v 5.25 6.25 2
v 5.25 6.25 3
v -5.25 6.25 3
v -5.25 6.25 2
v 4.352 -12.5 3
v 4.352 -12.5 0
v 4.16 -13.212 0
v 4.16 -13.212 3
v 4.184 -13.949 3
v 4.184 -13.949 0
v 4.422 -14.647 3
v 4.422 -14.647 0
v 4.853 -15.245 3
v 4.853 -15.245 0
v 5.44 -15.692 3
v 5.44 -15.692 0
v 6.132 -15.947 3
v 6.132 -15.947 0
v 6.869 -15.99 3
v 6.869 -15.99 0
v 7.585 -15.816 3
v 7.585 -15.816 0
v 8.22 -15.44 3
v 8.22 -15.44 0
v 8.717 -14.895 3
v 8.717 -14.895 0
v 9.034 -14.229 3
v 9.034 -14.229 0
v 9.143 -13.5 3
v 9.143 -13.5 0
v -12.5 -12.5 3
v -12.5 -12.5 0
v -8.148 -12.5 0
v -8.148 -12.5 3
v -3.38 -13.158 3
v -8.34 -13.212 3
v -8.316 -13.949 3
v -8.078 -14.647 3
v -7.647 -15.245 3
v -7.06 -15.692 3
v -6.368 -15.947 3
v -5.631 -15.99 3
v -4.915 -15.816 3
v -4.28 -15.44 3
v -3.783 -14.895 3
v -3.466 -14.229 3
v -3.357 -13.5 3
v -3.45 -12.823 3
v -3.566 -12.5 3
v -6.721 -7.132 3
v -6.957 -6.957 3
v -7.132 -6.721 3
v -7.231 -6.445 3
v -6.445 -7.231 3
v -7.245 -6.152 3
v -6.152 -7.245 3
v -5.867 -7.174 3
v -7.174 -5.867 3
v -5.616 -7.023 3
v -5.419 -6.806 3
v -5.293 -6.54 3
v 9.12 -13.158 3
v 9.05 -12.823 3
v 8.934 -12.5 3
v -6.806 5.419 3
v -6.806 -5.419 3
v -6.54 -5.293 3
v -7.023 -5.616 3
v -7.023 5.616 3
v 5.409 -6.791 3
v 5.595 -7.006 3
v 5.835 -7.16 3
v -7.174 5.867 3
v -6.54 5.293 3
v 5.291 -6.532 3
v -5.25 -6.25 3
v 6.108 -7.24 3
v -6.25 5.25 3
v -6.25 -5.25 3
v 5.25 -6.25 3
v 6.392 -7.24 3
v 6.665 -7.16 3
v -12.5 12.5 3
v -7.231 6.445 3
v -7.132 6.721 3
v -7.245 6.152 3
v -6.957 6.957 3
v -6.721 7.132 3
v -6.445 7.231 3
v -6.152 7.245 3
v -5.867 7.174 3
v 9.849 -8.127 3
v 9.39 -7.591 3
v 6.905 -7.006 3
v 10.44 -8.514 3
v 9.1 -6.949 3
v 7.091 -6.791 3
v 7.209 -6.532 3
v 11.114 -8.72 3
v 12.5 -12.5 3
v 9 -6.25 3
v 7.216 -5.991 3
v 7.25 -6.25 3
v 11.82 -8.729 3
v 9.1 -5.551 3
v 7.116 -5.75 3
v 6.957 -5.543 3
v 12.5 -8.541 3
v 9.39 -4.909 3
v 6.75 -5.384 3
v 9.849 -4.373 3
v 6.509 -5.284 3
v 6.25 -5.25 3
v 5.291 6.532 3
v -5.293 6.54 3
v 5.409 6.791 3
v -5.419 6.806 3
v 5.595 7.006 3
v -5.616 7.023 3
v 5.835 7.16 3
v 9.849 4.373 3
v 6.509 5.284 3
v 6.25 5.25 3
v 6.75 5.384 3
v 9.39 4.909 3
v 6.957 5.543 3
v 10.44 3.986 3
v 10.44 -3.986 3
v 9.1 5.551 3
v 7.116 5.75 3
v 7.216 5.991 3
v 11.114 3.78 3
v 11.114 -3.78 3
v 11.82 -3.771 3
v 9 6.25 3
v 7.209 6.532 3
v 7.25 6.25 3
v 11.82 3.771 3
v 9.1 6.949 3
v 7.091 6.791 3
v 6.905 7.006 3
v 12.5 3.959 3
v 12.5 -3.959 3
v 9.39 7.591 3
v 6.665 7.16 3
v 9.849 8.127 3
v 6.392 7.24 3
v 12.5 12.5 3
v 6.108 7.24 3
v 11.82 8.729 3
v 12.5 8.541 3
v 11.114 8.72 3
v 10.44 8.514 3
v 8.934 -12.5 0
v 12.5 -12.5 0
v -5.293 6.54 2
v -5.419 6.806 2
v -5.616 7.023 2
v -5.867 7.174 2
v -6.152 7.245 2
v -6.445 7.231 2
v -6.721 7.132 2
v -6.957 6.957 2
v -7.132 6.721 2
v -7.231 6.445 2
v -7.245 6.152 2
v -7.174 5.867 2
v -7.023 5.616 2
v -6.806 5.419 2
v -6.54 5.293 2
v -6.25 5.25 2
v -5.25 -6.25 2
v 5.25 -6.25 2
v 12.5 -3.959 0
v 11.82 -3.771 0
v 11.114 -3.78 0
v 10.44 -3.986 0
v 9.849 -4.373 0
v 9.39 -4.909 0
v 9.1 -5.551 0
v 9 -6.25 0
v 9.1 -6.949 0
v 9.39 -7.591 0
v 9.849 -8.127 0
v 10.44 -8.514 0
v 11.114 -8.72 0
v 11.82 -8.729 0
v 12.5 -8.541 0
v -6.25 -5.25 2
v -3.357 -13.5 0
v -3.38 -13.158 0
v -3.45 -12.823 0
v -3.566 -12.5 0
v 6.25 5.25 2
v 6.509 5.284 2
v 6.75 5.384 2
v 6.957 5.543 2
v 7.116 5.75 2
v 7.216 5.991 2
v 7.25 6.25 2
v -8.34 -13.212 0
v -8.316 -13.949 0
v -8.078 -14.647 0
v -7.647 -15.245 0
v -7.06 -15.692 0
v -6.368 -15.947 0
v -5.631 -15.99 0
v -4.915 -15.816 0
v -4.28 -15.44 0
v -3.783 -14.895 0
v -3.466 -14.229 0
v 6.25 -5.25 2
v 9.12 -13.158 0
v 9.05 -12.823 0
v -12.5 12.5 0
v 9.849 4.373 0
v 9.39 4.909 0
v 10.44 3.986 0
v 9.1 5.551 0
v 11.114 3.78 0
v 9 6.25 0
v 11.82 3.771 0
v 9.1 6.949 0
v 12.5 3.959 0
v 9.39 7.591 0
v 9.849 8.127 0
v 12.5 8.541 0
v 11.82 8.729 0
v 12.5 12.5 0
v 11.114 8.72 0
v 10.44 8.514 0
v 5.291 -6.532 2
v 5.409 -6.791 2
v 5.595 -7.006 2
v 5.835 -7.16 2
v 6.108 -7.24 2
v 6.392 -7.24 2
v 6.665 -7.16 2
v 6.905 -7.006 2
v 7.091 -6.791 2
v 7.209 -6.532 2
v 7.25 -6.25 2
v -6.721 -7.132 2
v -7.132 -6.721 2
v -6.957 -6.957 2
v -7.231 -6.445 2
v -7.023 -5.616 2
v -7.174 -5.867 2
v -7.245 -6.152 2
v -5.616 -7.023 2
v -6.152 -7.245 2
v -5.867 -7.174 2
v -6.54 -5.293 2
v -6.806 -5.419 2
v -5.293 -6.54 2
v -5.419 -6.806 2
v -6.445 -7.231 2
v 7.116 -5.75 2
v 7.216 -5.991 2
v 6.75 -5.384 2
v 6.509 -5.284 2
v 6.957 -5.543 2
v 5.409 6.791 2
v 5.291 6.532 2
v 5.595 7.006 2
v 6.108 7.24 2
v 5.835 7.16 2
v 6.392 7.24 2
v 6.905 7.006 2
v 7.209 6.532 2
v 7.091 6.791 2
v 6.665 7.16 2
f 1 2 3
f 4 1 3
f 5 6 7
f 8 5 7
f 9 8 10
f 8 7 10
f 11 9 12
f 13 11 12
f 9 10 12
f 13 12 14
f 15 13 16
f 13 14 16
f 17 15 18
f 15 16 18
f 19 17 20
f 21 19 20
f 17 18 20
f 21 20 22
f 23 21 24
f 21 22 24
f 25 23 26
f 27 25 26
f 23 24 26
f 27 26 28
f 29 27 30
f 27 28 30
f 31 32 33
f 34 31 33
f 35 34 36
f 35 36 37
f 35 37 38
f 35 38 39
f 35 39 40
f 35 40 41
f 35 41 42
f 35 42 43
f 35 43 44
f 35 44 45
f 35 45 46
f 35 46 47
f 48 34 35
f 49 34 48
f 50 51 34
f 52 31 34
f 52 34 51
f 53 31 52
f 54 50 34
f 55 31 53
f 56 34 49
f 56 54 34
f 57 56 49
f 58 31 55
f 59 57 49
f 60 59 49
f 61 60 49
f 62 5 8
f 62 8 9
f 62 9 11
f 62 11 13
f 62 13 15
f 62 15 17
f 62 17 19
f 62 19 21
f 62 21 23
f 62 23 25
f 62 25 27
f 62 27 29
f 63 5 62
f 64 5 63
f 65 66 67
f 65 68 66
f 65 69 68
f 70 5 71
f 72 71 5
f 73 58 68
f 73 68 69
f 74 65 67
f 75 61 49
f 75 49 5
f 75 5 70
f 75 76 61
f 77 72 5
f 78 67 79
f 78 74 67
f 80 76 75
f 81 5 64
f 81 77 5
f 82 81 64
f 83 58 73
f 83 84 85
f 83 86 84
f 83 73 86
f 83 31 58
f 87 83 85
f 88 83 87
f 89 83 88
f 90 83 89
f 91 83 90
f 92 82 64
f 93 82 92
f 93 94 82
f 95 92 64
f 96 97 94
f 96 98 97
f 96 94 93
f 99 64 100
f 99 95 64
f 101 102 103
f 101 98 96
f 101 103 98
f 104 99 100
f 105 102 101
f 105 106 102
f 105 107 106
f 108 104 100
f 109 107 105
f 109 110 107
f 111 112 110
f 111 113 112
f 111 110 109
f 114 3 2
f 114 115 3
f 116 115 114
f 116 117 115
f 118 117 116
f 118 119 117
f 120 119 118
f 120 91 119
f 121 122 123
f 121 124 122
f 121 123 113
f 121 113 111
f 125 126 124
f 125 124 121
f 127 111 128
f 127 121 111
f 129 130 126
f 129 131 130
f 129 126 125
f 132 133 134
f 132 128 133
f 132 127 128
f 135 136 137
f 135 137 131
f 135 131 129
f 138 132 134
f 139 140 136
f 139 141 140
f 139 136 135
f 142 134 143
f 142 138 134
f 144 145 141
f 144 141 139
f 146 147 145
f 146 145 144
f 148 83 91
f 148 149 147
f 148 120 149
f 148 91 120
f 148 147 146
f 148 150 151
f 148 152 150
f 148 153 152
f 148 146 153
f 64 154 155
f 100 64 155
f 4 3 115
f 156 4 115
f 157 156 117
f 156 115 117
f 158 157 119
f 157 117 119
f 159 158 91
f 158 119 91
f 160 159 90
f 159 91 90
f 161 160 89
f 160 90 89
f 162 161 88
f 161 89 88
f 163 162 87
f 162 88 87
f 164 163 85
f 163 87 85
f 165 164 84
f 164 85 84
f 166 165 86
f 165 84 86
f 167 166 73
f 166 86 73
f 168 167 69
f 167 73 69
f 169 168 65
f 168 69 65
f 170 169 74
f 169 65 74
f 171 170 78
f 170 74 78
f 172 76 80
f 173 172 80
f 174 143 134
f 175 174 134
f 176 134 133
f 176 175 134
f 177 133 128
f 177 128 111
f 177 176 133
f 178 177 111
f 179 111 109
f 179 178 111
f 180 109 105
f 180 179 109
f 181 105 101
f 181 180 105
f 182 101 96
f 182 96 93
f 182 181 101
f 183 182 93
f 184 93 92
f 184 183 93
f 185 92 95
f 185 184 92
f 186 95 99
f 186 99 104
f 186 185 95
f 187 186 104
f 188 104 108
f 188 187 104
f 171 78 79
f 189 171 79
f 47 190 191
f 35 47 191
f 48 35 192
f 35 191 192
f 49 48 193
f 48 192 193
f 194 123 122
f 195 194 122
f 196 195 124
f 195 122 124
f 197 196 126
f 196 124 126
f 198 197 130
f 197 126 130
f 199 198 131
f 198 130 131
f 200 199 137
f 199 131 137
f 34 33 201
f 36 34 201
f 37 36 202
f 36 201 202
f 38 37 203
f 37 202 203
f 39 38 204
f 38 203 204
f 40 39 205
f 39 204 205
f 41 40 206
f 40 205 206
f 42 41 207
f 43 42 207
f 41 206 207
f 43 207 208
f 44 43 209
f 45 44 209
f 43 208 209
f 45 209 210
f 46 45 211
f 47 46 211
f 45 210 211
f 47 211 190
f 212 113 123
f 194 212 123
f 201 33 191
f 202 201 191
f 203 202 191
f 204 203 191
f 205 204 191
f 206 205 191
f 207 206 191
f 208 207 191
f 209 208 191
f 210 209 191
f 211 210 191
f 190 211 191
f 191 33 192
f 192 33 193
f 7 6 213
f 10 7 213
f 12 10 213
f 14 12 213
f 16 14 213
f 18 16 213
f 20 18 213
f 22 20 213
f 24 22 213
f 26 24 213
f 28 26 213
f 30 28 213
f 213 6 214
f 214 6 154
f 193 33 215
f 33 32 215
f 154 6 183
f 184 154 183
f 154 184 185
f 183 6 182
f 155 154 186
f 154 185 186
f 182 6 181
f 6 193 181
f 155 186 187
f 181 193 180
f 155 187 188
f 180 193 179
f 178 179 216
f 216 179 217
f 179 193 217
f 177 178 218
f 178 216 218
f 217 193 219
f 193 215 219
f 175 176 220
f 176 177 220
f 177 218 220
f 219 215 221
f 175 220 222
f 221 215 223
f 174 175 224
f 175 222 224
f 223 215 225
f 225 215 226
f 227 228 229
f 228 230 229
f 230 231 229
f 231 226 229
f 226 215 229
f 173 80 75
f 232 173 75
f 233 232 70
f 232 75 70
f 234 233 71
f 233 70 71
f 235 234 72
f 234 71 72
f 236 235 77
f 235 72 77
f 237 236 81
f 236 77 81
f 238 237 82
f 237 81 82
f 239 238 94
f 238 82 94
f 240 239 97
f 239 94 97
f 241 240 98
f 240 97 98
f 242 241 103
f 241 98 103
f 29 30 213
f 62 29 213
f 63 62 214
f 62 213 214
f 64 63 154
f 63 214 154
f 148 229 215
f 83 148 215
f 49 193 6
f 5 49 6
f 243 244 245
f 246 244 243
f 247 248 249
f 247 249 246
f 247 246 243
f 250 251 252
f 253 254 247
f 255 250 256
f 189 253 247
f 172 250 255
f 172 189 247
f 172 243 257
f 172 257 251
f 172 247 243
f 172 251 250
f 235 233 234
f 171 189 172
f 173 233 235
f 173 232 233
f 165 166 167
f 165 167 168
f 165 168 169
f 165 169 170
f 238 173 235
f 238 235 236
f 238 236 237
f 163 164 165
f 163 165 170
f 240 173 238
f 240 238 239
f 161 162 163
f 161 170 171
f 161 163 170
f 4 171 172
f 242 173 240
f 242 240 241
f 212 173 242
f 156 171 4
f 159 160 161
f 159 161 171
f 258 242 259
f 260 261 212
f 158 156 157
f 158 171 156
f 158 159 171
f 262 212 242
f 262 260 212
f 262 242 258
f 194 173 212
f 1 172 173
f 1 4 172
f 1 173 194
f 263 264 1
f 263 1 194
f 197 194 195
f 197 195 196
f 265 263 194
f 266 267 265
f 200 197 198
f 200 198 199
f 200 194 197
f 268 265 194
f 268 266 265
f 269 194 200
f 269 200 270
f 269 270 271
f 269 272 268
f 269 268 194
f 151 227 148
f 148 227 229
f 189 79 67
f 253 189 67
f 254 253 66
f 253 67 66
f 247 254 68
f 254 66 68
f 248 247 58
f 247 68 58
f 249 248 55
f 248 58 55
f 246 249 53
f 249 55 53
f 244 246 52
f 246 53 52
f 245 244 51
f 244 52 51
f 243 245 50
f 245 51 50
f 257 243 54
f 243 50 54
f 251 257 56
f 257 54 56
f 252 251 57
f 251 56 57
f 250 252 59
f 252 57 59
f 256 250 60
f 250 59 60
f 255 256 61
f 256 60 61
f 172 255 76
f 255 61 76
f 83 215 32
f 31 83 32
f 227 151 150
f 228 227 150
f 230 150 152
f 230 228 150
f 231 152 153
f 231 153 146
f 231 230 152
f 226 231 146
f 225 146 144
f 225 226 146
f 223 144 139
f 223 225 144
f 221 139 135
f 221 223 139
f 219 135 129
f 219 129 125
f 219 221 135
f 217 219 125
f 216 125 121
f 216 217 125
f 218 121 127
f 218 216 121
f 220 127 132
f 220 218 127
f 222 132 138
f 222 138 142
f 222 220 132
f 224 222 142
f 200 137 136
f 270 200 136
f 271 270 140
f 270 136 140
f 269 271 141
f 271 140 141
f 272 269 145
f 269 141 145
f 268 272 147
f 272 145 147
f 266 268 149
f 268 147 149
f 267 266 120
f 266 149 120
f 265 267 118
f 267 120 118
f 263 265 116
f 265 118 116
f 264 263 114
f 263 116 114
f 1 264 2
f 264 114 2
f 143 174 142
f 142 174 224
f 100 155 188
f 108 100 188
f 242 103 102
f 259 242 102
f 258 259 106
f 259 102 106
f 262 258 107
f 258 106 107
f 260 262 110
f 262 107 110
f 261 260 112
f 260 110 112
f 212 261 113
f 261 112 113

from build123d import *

# Parameters (mm, degrees)
F1_DEPTH = 3
F3_DEPTH = 1
F4_R     = 2.5
F5_DEPTH = 3
F6_DEPTH = 3


with BuildPart() as f1:
    # F0 (on Top) → F1 (new body)
    with BuildSketch(Plane.XY):
        with BuildLine():
            Line((12.5, -12.5), (12.5, 12.5))
            Line((12.5, 12.5), (-12.5, 12.5))
            Line((-12.5, 12.5), (-12.5, -12.5))
            Line((-12.5, -12.5), (-8.1482400118, -12.5))
            ThreePointArc((-8.1482400118, -12.5), (-5.8569521643, -11), (-3.5656643168, -12.5))
            Line((-3.5656643168, -12.5), (4.3517599882, -12.5))
            ThreePointArc((4.3517599882, -12.5), (6.6430478357, -11), (8.9343356832, -12.5))
            Line((8.9343356832, -12.5), (12.5, -12.5))
        make_face()
        with BuildLine():
            ThreePointArc((9.1430478357, -13.5), (9.090313618, -12.9892258908), (8.9343356832, -12.5))
            Line((8.9343356832, -12.5), (4.3517599882, -12.5))
            ThreePointArc((4.3517599882, -12.5), (6.1322737265, -15.9472657823), (9.1430478357, -13.5))
        make_face()
        with BuildLine():
            Line((4.3517599882, -12.5), (8.9343356832, -12.5))
            ThreePointArc((8.9343356832, -12.5), (6.6430478357, -11), (4.3517599882, -12.5))
        make_face()
        with BuildLine():
            ThreePointArc((-3.5656643168, -12.5), (-5.8569521643, -11), (-8.1482400118, -12.5))
            Line((-8.1482400118, -12.5), (-3.5656643168, -12.5))
        make_face()
        with BuildLine():
            Line((-3.5656643168, -12.5), (-8.1482400118, -12.5))
            ThreePointArc((-8.1482400118, -12.5), (-6.3677262735, -15.9472657823), (-3.3569521643, -13.5))
            ThreePointArc((-3.3569521643, -13.5), (-3.409686382, -12.9892258908), (-3.5656643168, -12.5))
        make_face()
    extrude(amount=F1_DEPTH)

    # F2 (on face) → F3 (cut)
    with BuildSketch(Plane.XY.offset(3)):
        with BuildLine():
            Line((5.25, 6.25), (-5.25, 6.25))
            ThreePointArc((-5.25, 6.25), (-5.5428932188, 5.5428932188), (-6.25, 5.25))
            Line((-6.25, 5.25), (-6.25, -5.25))
            ThreePointArc((-6.25, -5.25), (-5.5428932188, -5.5428932188), (-5.25, -6.25))
            Line((-5.25, -6.25), (5.25, -6.25))
            ThreePointArc((5.25, -6.25), (5.5428932188, -5.5428932188), (6.25, -5.25))
            Line((6.25, -5.25), (6.25, 5.25))
            ThreePointArc((6.25, 5.25), (5.5428932188, 5.5428932188), (5.25, 6.25))
        make_face()
        with BuildLine():
            ThreePointArc((-6.25, 5.25), (-5.5428932188, 5.5428932188), (-5.25, 6.25))
            Line((-5.25, 6.25), (-6.25, 6.25))
            Line((-6.25, 6.25), (-6.25, 5.25))
        make_face()
        with BuildLine():
            Line((-6.25, 6.25), (-5.25, 6.25))
            ThreePointArc((-5.25, 6.25), (-6.9571067812, 6.9571067812), (-6.25, 5.25))
            Line((-6.25, 5.25), (-6.25, 6.25))
        make_face()
        with BuildLine():
            ThreePointArc((7.25, 6.25), (6.25, 7.25), (5.25, 6.25))
            Line((5.25, 6.25), (6.25, 6.25))
            Line((6.25, 6.25), (6.25, 5.25))
            ThreePointArc((6.25, 5.25), (6.9571067812, 5.5428932188), (7.25, 6.25))
        make_face()
        with BuildLine():
            Line((6.25, 6.25), (5.25, 6.25))
            ThreePointArc((5.25, 6.25), (5.5428932188, 5.5428932188), (6.25, 5.25))
            Line((6.25, 5.25), (6.25, 6.25))
        make_face()
        with BuildLine():
            Line((6.25, -6.25), (6.25, -5.25))
            ThreePointArc((6.25, -5.25), (5.5428932188, -5.5428932188), (5.25, -6.25))
            Line((5.25, -6.25), (6.25, -6.25))
        make_face()
        with BuildLine():
            ThreePointArc((7.25, -6.25), (6.9571067812, -5.5428932188), (6.25, -5.25))
            Line((6.25, -5.25), (6.25, -6.25))
            Line((6.25, -6.25), (5.25, -6.25))
            ThreePointArc((5.25, -6.25), (6.25, -7.25), (7.25, -6.25))
        make_face()
        with BuildLine():
            ThreePointArc((-5.25, -6.25), (-5.5428932188, -5.5428932188), (-6.25, -5.25))
            Line((-6.25, -5.25), (-6.25, -6.25))
            Line((-6.25, -6.25), (-5.25, -6.25))
        make_face()
        with BuildLine():
            Line((-6.25, -6.25), (-6.25, -5.25))
            ThreePointArc((-6.25, -5.25), (-6.9571067812, -6.9571067812), (-5.25, -6.25))
            Line((-5.25, -6.25), (-6.25, -6.25))
        make_face()
    extrude(amount=-F3_DEPTH, mode=Mode.SUBTRACT)

    # F4 (on Top) → F5 (cut)
    with BuildSketch(Plane.XY):
        with Locations((11.5, 6.25)):
            Circle(F4_R)
        with Locations((11.5, -6.25)):
            Circle(F4_R)
    extrude(amount=-F5_DEPTH, mode=Mode.SUBTRACT)


with BuildPart() as f6:
    # F4 (on Top) → F6 (new body)
    with BuildSketch(Plane.XY):
        with Locations((11.5, 6.25)):
            Circle(F4_R)
    extrude(amount=F6_DEPTH)


with BuildPart() as f6b:
    # F4 (on Top) → F6, piece 2 (new body)
    with BuildSketch(Plane.XY):
        with Locations((11.5, -6.25)):
            Circle(F4_R)
    extrude(amount=F6_DEPTH)


with BuildPart() as f1_1:
    add(f1.part)

    # F7: cut F6b, F6
    add(f6b.part, mode=Mode.SUBTRACT)
    add(f6.part, mode=Mode.SUBTRACT)


solid = f1_1.part
